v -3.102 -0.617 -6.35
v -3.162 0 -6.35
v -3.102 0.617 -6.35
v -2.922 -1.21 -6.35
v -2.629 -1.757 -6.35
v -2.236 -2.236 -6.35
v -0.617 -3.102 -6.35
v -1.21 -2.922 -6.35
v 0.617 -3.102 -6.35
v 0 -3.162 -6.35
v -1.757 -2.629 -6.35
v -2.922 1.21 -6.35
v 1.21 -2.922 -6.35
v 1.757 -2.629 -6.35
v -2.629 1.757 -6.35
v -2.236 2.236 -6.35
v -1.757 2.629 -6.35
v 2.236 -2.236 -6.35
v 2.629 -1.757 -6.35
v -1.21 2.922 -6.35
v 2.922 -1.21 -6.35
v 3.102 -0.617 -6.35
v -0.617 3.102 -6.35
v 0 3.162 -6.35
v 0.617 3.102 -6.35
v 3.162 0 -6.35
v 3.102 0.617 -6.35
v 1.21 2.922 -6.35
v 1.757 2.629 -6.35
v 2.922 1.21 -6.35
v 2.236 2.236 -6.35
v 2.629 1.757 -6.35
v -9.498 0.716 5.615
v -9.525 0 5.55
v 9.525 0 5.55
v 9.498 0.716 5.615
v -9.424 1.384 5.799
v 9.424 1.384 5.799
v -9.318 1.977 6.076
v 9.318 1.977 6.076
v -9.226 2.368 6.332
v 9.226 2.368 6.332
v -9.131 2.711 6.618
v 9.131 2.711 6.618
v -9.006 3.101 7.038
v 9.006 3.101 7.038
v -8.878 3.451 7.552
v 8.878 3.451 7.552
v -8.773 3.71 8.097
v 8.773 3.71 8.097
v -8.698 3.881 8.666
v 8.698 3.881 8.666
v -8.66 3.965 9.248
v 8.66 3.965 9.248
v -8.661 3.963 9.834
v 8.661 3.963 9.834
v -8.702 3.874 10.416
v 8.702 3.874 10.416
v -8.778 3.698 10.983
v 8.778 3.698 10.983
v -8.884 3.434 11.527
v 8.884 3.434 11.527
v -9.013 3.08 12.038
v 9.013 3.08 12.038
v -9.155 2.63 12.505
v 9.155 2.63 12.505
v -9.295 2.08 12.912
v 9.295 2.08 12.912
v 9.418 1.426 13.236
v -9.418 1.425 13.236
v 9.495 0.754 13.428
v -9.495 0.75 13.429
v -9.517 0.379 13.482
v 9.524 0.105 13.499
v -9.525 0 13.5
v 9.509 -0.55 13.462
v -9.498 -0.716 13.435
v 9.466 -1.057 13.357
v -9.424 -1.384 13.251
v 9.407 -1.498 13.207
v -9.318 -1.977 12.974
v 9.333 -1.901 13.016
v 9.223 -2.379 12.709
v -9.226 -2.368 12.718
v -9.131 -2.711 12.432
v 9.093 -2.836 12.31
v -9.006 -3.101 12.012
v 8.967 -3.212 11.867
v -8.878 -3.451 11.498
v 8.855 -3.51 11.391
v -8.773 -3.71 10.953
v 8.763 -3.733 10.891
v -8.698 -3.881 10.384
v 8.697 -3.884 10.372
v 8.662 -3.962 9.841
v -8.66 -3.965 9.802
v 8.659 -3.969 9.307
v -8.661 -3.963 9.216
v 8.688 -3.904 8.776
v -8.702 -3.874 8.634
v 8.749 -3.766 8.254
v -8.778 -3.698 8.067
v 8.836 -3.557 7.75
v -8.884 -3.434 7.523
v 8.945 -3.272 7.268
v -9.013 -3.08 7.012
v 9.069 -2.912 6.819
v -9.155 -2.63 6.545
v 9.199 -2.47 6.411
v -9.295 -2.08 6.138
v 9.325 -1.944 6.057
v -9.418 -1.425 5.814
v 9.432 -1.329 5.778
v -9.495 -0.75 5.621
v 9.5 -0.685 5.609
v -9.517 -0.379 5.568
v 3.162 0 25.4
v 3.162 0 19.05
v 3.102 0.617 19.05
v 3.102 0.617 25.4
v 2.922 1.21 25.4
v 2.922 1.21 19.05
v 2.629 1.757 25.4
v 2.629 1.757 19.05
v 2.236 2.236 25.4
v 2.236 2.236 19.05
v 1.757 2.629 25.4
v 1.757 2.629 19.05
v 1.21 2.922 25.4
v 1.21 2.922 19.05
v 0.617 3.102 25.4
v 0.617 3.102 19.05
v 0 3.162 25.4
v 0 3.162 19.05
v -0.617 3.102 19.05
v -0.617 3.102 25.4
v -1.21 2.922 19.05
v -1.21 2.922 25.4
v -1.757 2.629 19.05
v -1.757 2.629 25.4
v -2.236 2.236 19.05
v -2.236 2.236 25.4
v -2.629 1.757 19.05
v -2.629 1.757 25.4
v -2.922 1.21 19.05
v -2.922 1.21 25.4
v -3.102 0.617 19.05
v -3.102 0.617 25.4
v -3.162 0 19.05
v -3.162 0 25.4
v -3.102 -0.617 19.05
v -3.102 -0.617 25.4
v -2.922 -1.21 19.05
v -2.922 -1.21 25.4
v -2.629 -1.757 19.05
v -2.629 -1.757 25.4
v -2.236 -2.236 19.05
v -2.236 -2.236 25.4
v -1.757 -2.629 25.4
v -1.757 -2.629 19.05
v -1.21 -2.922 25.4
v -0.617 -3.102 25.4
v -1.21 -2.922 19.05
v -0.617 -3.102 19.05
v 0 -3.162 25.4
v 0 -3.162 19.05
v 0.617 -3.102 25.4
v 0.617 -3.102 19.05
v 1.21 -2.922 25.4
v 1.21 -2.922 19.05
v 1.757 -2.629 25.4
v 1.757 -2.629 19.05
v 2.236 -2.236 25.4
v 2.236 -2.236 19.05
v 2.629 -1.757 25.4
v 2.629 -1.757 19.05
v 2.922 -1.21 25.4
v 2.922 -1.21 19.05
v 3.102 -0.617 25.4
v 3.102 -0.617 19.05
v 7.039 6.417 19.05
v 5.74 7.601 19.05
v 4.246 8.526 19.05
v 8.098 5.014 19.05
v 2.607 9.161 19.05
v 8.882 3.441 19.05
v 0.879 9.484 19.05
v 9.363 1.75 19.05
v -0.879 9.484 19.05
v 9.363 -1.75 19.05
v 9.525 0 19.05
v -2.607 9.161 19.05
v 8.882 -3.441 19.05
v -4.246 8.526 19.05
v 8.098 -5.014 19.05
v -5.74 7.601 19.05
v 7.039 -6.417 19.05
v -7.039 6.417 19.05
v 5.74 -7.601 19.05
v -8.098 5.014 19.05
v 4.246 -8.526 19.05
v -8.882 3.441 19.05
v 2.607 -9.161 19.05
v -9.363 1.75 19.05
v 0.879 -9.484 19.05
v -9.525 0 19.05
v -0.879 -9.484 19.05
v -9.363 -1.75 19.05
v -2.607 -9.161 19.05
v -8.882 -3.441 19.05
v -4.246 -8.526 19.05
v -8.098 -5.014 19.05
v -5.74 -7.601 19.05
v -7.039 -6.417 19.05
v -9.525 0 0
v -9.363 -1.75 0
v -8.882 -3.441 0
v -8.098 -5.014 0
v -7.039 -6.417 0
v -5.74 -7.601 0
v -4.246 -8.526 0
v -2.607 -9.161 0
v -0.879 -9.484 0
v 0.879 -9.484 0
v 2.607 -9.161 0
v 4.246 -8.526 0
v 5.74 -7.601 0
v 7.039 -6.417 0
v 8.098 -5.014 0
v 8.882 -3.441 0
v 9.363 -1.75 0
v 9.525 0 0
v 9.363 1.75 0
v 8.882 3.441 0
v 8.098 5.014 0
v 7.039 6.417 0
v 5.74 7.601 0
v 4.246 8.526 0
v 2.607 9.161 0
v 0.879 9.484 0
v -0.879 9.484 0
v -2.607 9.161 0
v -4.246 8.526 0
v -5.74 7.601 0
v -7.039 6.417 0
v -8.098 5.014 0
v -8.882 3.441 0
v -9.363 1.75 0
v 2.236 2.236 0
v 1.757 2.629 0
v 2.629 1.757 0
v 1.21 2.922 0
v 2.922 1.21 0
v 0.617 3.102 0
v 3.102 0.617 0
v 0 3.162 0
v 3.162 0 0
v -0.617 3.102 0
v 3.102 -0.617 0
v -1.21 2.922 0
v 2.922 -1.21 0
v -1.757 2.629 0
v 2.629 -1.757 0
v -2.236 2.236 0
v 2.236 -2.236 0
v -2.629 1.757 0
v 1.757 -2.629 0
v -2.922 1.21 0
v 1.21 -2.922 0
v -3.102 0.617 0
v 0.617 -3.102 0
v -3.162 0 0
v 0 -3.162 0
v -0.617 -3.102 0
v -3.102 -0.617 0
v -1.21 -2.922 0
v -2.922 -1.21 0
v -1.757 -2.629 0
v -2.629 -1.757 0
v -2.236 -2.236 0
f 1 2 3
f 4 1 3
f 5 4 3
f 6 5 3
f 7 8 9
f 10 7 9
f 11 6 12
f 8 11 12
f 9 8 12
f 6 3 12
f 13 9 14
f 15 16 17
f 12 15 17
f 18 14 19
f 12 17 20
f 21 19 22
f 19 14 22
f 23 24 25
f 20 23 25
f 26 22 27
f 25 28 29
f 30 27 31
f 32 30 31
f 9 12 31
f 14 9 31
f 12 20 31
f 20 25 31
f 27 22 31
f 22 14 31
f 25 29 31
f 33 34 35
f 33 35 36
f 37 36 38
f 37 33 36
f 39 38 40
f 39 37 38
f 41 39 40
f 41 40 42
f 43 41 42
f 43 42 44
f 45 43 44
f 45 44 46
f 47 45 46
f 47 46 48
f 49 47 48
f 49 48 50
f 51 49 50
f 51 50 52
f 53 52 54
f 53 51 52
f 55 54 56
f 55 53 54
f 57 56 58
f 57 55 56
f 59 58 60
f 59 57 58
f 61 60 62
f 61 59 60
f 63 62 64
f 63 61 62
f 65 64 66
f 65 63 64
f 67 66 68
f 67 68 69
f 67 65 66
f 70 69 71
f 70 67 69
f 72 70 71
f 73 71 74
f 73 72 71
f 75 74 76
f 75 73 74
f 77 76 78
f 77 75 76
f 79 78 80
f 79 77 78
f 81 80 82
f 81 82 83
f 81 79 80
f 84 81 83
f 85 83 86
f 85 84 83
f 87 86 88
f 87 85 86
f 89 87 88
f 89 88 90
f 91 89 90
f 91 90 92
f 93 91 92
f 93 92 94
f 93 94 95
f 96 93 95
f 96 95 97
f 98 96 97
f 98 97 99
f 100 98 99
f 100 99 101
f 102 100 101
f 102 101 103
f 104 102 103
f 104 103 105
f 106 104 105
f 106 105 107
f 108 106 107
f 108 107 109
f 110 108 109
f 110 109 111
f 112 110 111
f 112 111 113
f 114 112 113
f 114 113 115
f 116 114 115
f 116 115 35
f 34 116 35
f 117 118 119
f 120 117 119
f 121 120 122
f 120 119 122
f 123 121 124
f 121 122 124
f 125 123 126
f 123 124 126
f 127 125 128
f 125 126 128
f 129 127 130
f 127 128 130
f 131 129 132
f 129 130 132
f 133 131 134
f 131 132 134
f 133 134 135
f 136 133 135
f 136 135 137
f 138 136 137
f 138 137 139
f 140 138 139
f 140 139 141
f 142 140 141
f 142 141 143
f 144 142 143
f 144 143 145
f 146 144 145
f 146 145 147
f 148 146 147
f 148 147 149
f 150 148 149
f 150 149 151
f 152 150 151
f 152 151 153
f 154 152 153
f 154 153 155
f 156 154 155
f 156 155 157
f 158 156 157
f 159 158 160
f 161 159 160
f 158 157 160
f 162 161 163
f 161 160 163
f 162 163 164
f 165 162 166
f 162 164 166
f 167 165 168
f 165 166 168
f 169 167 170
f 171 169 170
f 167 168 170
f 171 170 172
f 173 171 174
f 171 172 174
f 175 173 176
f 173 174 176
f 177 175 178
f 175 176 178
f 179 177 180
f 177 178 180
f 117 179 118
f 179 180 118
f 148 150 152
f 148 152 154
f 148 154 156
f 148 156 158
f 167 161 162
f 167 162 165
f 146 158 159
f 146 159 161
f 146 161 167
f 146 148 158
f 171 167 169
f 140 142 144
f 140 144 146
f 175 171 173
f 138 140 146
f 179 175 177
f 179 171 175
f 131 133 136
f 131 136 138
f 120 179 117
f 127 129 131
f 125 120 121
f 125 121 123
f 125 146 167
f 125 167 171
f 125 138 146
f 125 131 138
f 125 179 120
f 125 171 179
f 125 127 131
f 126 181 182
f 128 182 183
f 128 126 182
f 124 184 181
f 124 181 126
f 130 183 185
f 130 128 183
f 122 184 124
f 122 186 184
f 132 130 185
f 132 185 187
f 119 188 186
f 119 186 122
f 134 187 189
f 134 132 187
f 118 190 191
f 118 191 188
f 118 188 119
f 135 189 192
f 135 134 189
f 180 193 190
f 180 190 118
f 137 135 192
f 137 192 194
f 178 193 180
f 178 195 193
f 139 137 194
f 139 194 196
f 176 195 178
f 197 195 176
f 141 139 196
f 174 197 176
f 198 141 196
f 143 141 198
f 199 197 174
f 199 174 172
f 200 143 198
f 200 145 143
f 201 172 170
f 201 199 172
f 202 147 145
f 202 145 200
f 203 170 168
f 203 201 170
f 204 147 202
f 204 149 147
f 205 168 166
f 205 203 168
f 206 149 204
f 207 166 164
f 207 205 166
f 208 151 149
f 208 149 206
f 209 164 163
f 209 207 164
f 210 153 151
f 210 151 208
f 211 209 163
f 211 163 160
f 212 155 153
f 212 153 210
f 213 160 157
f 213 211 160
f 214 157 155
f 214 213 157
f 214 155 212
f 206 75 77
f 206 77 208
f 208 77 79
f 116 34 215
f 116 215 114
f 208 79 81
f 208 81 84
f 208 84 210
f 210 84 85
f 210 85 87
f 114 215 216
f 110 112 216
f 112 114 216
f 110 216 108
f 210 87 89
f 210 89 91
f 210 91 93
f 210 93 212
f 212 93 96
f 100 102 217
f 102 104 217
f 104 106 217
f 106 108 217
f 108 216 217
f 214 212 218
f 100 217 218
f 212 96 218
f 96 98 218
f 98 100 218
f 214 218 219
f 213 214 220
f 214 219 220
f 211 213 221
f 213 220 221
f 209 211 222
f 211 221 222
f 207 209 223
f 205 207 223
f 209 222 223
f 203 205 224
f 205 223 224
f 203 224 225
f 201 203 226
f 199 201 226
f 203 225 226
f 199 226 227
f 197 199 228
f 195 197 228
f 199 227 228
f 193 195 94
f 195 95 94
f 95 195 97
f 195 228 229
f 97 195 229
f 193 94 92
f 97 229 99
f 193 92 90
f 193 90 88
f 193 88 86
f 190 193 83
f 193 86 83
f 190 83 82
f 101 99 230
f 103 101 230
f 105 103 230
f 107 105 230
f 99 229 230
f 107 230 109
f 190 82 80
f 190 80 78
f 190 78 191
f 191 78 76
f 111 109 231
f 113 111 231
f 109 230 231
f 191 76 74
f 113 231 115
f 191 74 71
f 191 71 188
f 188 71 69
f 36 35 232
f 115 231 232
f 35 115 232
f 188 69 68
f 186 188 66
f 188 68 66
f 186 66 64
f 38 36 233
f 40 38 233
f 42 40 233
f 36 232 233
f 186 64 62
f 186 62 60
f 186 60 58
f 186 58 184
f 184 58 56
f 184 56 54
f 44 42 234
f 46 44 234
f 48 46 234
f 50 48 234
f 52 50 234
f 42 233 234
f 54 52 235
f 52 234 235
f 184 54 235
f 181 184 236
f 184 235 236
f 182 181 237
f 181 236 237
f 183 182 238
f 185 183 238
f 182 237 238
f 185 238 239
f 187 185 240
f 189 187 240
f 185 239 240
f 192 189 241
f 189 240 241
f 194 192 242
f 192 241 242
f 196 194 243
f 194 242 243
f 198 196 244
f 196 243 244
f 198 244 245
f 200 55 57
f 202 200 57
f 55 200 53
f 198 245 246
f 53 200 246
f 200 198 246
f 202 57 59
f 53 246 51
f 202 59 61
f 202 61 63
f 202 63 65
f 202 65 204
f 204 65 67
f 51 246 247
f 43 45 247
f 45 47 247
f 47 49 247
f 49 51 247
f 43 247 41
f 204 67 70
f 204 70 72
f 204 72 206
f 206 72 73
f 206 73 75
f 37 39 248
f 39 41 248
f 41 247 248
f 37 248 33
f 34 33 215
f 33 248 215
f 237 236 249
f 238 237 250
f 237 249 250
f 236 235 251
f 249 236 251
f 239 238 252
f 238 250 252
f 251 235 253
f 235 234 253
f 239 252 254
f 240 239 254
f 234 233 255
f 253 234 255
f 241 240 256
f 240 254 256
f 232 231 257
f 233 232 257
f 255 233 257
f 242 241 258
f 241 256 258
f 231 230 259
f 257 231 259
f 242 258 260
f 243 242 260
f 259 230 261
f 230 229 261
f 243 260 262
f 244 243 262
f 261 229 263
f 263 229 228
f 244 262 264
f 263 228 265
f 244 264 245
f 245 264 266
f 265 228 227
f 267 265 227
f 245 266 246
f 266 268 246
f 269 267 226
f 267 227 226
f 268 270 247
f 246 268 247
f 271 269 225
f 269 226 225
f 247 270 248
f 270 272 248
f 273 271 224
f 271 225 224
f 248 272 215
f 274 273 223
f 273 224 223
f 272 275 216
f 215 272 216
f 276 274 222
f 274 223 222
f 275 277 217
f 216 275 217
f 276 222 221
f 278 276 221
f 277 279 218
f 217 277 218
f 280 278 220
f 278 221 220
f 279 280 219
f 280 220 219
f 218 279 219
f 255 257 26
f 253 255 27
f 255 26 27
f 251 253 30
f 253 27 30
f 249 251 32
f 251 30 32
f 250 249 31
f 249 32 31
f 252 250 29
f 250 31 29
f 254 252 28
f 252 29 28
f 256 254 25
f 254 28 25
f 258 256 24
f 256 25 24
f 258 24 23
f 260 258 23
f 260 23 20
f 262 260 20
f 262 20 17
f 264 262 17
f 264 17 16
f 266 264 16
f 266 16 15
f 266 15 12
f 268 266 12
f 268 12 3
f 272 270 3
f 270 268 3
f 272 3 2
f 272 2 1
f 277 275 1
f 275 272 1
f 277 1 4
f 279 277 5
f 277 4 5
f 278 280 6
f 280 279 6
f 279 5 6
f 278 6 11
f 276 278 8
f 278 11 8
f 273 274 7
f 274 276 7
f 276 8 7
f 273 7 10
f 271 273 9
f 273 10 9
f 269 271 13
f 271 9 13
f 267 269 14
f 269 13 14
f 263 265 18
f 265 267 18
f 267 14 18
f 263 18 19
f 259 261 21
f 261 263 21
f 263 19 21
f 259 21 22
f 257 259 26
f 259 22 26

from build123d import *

# Parameters (mm, degrees)
SKETCH1_R                = 9.525
BOSS_EXTRUDE1_DEPTH      = 19.05
BOSS_EXTRUDE2_DEPTH      = 6.35
BOSS_EXTRUDE2_DEPTH_BACK = 25.4
SKETCH2_R                = 3.1623
CUT_EXTRUDE1_DEPTH       = 29.750847814
CUT_EXTRUDE1_DEPTH_BACK  = 29.750847814
SKETCH3_R                = 3.9751


with BuildPart() as part:
    # Sketch1 → Boss-Extrude1 (new body)
    with BuildSketch(Plane.XY):
        with Locations(Location((0, 0, 0), (0, 0, 180))):
            Circle(SKETCH1_R)
    extrude(amount=BOSS_EXTRUDE1_DEPTH)

    # Sketch2 → Boss-Extrude2 (add, two sides: drawn at the far end of the back side and taken through both)
    with BuildSketch(Plane.XY.offset(19.05).offset(-BOSS_EXTRUDE2_DEPTH_BACK)):
        Circle(SKETCH2_R)
    extrude(amount=BOSS_EXTRUDE2_DEPTH + BOSS_EXTRUDE2_DEPTH_BACK)

    # Sketch3 → Cut-Extrude1 (cut, two sides: drawn at the far end of the back side and taken through both)
    with BuildSketch(Plane(origin=(0, 0, 0), x_dir=(0, 0, -1), z_dir=(1, 0, 0)).offset(-CUT_EXTRUDE1_DEPTH_BACK)):
        with Locations((-9.525, 0)):
            Circle(SKETCH3_R)
    extrude(amount=CUT_EXTRUDE1_DEPTH + CUT_EXTRUDE1_DEPTH_BACK, mode=Mode.SUBTRACT)


solid = part.part
